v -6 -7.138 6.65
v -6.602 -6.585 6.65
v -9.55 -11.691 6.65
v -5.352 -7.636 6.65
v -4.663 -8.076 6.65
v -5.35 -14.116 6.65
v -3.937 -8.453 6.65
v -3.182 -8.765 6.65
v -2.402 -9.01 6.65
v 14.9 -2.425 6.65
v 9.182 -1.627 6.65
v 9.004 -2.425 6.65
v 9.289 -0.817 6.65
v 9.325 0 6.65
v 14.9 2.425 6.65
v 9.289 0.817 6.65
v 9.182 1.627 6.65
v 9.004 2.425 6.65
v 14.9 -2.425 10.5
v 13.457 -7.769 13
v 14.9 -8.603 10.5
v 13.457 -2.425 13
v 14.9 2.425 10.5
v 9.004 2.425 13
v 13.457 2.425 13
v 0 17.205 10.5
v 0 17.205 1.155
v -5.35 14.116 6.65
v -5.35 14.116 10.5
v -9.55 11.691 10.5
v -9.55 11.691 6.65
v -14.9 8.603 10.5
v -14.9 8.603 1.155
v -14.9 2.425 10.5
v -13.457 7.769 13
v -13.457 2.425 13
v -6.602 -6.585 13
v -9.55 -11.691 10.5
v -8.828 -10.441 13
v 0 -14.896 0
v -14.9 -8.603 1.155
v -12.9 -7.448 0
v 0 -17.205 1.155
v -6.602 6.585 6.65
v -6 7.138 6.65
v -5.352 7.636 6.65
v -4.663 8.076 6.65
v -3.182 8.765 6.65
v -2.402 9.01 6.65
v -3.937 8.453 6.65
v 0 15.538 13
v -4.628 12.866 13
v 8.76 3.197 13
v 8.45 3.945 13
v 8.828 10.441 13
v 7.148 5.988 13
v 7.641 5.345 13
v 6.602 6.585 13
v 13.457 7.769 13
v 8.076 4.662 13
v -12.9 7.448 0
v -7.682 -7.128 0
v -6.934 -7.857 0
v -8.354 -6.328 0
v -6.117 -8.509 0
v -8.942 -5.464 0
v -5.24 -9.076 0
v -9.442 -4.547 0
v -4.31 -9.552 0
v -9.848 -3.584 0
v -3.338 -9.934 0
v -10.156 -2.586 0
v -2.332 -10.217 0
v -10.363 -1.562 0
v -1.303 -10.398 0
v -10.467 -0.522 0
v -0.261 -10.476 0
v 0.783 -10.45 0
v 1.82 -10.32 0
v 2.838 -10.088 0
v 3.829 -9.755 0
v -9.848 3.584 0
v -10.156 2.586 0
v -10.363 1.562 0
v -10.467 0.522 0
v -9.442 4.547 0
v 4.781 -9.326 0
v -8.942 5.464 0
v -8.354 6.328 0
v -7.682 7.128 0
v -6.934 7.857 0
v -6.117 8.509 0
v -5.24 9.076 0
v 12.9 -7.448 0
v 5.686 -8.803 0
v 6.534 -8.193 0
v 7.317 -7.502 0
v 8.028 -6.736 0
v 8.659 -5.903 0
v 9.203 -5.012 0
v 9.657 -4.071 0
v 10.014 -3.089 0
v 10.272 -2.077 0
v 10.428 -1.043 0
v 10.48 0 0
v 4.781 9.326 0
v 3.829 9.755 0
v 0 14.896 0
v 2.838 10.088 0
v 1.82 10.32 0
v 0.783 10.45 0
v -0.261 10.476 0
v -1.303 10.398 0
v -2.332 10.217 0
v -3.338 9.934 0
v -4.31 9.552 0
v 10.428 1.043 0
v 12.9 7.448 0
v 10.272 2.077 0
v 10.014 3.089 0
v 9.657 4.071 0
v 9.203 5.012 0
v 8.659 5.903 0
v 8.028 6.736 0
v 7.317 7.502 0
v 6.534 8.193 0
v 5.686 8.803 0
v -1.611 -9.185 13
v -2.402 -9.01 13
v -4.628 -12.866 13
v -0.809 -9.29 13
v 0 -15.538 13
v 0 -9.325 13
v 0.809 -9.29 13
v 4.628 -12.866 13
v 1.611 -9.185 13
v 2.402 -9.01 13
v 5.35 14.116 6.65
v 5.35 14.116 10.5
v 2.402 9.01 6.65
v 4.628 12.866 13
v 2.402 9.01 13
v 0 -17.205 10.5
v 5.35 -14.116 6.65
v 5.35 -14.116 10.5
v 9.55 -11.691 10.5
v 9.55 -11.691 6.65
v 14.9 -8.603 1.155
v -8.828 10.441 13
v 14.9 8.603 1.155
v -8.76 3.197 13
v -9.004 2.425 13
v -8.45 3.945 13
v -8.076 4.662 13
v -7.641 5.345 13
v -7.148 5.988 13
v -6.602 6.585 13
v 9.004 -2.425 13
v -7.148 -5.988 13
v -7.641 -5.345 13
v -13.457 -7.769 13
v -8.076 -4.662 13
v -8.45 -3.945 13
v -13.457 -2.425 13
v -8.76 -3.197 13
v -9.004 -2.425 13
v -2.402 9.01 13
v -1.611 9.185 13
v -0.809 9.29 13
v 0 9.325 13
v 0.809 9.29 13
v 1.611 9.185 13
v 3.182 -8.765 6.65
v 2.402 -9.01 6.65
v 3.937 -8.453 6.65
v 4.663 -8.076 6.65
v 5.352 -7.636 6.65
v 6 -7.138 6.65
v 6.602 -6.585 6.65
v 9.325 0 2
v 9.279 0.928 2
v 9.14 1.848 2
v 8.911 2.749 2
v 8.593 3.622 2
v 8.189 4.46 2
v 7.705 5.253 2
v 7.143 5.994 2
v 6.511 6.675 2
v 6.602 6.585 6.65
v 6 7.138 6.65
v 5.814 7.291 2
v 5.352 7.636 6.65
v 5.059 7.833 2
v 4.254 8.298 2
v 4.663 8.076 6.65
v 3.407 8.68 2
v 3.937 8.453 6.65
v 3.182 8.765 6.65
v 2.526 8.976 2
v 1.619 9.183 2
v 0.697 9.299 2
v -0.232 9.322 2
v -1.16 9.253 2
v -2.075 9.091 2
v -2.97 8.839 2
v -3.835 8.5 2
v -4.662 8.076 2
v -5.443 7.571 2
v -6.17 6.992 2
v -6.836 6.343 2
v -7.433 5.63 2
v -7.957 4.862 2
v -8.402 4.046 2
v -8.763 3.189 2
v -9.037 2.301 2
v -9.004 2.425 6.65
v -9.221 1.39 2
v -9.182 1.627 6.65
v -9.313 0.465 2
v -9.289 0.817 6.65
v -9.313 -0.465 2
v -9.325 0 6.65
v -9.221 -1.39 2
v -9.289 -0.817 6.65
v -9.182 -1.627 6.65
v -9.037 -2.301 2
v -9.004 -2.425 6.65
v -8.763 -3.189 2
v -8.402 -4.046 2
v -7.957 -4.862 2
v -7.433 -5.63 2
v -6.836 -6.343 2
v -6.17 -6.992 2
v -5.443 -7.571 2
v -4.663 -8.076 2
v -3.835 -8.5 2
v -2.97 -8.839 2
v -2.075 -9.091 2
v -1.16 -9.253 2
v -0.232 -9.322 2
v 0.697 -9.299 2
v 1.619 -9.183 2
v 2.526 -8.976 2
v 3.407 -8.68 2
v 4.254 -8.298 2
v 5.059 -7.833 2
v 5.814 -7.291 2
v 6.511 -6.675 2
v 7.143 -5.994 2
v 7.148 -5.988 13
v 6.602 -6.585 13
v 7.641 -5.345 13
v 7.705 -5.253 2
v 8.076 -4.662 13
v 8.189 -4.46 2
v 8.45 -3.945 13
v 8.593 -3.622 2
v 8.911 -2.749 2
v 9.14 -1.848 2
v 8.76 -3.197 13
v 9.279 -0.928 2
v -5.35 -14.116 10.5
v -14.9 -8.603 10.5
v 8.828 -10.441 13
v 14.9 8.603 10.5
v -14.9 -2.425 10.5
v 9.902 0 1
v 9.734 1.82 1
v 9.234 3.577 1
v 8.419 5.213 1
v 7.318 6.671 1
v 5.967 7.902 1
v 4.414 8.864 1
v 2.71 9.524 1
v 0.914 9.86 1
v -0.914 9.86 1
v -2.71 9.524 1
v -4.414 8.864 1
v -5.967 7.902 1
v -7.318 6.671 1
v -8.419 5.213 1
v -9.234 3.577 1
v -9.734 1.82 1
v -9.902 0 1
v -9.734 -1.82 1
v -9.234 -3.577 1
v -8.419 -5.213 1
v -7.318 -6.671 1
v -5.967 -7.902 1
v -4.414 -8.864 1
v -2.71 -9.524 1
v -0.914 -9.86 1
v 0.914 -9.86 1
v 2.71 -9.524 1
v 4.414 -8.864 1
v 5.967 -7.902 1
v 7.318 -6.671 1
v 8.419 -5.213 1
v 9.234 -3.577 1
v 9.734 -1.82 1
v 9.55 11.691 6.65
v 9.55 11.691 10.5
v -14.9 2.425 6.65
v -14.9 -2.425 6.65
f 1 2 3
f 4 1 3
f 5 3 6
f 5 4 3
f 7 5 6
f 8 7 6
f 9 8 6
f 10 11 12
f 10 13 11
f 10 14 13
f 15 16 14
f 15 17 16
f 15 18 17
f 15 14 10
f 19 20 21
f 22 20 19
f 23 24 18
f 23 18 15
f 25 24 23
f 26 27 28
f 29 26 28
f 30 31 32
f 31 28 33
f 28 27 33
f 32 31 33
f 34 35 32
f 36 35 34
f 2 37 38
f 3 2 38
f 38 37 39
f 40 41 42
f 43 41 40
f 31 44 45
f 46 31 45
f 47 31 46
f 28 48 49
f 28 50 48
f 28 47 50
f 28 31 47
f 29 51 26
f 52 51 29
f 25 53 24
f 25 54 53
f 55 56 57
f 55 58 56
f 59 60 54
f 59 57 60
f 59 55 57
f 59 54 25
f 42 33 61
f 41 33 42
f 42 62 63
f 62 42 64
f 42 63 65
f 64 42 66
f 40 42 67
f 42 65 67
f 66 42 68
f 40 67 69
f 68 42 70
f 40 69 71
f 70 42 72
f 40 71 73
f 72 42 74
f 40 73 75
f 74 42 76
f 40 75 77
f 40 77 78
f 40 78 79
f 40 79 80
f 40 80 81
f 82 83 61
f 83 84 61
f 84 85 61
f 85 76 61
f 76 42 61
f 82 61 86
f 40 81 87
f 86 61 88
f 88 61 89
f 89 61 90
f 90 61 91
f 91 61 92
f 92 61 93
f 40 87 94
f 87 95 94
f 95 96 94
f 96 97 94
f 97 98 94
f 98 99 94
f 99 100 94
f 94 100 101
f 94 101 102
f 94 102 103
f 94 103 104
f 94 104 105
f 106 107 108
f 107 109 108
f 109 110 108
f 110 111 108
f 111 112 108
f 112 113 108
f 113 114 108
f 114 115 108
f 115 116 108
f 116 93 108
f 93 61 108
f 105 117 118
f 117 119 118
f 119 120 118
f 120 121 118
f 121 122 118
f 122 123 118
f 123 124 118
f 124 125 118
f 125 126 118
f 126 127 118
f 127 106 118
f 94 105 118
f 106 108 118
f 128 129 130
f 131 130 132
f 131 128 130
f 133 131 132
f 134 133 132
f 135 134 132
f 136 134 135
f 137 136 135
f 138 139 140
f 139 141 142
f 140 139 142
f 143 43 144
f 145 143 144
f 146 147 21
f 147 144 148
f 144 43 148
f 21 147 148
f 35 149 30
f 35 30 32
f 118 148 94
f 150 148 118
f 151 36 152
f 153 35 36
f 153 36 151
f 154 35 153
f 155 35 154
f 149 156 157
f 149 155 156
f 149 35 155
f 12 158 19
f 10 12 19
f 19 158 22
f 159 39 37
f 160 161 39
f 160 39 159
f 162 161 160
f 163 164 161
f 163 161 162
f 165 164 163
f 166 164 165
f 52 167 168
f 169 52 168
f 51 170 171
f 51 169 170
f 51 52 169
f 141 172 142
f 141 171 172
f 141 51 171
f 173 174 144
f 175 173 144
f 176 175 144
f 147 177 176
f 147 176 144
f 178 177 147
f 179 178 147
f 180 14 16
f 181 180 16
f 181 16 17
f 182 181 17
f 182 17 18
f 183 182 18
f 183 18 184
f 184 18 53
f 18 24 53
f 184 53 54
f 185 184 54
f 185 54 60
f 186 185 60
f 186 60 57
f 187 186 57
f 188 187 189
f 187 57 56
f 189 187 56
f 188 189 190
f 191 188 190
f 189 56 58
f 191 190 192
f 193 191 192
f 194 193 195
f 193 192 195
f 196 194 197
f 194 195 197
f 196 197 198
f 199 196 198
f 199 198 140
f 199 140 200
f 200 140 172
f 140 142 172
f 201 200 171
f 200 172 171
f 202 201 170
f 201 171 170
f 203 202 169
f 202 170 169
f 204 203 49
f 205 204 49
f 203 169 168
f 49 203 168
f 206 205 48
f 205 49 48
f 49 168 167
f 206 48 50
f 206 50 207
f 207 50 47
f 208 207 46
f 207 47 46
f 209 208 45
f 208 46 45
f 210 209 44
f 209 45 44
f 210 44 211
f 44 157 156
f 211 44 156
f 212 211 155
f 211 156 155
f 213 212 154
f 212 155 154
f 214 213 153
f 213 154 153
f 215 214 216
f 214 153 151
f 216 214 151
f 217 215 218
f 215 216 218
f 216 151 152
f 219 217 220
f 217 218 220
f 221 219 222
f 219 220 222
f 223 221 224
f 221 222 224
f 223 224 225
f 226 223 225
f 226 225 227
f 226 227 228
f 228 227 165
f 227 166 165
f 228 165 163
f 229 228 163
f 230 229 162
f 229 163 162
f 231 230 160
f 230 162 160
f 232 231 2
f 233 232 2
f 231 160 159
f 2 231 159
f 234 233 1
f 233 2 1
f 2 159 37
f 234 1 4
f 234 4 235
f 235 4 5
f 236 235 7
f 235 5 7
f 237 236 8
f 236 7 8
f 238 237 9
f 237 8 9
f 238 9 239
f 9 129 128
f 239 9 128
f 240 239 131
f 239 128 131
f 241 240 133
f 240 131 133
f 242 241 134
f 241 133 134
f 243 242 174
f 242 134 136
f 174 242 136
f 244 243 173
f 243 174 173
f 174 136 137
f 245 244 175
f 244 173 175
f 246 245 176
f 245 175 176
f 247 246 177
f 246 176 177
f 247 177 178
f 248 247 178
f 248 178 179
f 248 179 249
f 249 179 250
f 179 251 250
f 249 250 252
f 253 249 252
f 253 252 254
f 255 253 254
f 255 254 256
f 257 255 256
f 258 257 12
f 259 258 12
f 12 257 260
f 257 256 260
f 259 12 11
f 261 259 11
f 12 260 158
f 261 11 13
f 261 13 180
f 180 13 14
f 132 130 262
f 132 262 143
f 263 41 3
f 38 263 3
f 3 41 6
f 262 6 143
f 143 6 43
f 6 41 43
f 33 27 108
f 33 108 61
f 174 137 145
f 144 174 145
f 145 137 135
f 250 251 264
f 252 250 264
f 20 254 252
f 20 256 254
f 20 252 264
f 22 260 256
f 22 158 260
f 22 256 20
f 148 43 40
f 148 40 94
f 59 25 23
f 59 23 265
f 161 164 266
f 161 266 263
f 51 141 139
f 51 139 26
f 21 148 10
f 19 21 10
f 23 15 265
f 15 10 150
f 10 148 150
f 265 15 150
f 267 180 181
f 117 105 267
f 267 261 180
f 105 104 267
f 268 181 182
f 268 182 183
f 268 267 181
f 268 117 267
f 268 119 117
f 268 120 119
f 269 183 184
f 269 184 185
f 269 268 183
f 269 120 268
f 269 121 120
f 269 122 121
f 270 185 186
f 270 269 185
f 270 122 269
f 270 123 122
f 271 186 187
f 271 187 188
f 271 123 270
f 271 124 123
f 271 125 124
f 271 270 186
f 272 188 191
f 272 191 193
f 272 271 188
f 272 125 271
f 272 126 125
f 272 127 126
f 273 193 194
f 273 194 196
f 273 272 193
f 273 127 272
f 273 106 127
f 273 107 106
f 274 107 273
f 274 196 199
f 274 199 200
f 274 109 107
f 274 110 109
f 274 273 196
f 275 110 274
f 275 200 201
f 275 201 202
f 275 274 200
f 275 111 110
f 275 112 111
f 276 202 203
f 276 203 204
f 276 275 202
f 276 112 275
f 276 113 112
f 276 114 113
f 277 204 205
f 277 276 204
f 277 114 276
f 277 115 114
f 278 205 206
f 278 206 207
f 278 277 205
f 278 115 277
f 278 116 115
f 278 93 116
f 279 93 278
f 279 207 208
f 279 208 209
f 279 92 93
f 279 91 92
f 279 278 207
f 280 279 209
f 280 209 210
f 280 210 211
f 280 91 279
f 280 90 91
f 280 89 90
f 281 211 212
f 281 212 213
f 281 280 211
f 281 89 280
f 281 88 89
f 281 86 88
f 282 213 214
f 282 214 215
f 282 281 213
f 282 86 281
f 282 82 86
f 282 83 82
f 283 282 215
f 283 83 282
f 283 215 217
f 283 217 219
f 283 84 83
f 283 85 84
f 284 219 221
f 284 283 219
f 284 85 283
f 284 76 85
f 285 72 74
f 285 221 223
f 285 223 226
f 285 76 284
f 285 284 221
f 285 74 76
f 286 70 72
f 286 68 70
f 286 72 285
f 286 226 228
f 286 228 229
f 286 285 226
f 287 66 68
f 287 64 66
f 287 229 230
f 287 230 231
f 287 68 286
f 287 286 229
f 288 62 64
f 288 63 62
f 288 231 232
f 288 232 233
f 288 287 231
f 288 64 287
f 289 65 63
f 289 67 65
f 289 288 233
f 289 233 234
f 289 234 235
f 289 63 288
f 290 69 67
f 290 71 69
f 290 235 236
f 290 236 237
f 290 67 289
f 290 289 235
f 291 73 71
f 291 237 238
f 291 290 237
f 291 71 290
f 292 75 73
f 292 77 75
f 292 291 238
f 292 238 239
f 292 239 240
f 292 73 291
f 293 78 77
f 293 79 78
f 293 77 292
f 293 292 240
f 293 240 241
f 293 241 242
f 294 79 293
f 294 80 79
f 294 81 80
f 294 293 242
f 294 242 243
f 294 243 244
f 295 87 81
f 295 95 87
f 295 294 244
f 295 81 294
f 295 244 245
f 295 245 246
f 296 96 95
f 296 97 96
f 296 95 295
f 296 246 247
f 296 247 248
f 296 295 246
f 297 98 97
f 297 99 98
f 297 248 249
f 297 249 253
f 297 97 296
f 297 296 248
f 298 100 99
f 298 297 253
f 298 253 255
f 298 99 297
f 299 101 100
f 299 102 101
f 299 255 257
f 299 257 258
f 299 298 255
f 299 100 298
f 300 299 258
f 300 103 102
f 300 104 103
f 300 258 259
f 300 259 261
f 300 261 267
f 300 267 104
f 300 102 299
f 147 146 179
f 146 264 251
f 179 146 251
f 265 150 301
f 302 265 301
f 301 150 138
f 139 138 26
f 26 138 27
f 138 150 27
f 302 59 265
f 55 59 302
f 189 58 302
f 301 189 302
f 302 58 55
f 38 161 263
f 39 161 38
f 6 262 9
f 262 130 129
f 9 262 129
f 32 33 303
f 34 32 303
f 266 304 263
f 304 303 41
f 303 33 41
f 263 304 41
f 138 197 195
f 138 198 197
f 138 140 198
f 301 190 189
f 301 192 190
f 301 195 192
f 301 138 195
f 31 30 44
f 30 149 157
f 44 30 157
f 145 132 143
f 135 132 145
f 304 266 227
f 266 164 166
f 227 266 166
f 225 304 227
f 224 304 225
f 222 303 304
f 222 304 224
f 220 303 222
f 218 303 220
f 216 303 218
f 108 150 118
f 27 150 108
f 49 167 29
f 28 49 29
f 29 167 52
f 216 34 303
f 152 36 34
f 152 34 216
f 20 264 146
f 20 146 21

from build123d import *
from OCP.BRepFilletAPI import BRepFilletAPI_MakeChamfer

# Parameters (mm, degrees)
RESSALTO_EXTRUS_O2_DEPTH = 13
ESBO_O3_R                = 9.325
CORTE_EXTRUS_O1_DEPTH    = 27.211129951
ESBO_O4_W                = 8.746276247
ESBO_O4_H                = 4.85
CORTE_EXTRUS_O2_DEPTH    = 6.35
CHANFRO1_SIZE            = 2.5
CHANFRO1_SIZE2           = 1.443375673
CHANFRO2_SIZE            = 2
CHANFRO2_SIZE2           = 1.154700538
CHANFRO3_SIZE            = 2
CHANFRO3_SIZE2           = 1.154700538


with BuildPart() as part:
    # Esboço1 → Ressalto-extrusão2 (new body)
    with BuildSketch(Plane.XY):
        Polygon((0, 17.205038022), (-14.9, 8.602519011), (-14.9, -8.602519011), (0, -17.205038022), (14.9, -8.602519011), (14.9, 8.602519011), align=None)
    extrude(amount=RESSALTO_EXTRUS_O2_DEPTH)

    # Esboço3 → Corte-extrusão1 (cut, through all)
    with BuildSketch(Plane.XY.offset(13)):
        Circle(ESBO_O3_R)
    extrude(amount=-CORTE_EXTRUS_O1_DEPTH, mode=Mode.SUBTRACT)

    # Esboço4 → Corte-extrusão2 (cut)
    with BuildSketch(Plane.XY.offset(13)):
        with Locations((-10.526861876, 0)):
            Rectangle(ESBO_O4_W, ESBO_O4_H)
        Polygon((-5.349888396, 14.116278516), (-9.550111604, 11.691278516), (-5.176973481, 4.116781098), (-0.976750273, 6.541781098), align=None)
        Polygon((9.550111604, 11.691278516), (5.349888396, 14.116278516), (0.976750273, 6.541781098), (5.176973481, 4.116781098), align=None)
        with Locations((10.526861876, 0)):
            Rectangle(ESBO_O4_W, ESBO_O4_H)
        Polygon((5.349888396, -14.116278516), (9.550111604, -11.691278516), (5.176973481, -4.116781098), (0.976750273, -6.541781098), align=None)
        Polygon((-9.550111604, -11.691278516), (-5.349888396, -14.116278516), (-0.976750273, -6.541781098), (-5.176973481, -4.116781098), align=None)
    extrude(amount=-CORTE_EXTRUS_O2_DEPTH, mode=Mode.SUBTRACT)

    # Chanfro1: one chamfer whose edges measure the first distance from different faces: ONE call of the kernel's chamfer builder (chamfer() names one face for all edges)
    chanfro1_edges_1 = [part.edges().sort_by_distance(p)[0] for p in [
        (-14.9, 5.513759505, 13),
        (-14.9, -5.513759505, 13),
    ]]
    chanfro1_side_1 = [part.faces().sort_by_distance(p)[0] for p in [
        (-14.9, 0, 5.969058161),
    ]]
    chanfro1_edges_2 = [part.edges().sort_by_distance(p)[0] for p in [
        (-2.674944198, -15.660658269, 13),
        (-12.225055802, -10.146898764, 13),
    ]]
    chanfro1_side_2 = [part.faces().sort_by_distance(p)[0] for p in [
        (-7.45, -12.903778516, 5.969058161),
    ]]
    chanfro1_edges_3 = [part.edges().sort_by_distance(p)[0] for p in [
        (2.674944198, -15.660658269, 13),
        (12.225055802, -10.146898764, 13),
    ]]
    chanfro1_side_3 = [part.faces().sort_by_distance(p)[0] for p in [
        (7.45, -12.903778516, 5.969058161),
    ]]
    chanfro1_edges_4 = [part.edges().sort_by_distance(p)[0] for p in [
        (14.9, -5.513759505, 13),
        (14.9, 5.513759505, 13),
    ]]
    chanfro1_side_4 = [part.faces().sort_by_distance(p)[0] for p in [
        (14.9, 0, 5.969058161),
    ]]
    chanfro1_edges_5 = [part.edges().sort_by_distance(p)[0] for p in [
        (12.225055802, 10.146898764, 13),
        (2.674944198, 15.660658269, 13),
    ]]
    chanfro1_side_5 = [part.faces().sort_by_distance(p)[0] for p in [
        (7.45, 12.903778516, 5.969058161),
    ]]
    chanfro1_edges_6 = [part.edges().sort_by_distance(p)[0] for p in [
        (-12.225055802, 10.146898764, 13),
        (-2.674944198, 15.660658269, 13),
    ]]
    chanfro1_side_6 = [part.faces().sort_by_distance(p)[0] for p in [
        (-7.45, 12.903778516, 5.969058161),
    ]]
    chanfro1 = BRepFilletAPI_MakeChamfer(part.part.solid().wrapped)
    for e in chanfro1_edges_1:
        chanfro1.Add(CHANFRO1_SIZE, CHANFRO1_SIZE2, e.wrapped, chanfro1_side_1[0].wrapped)  # the first distance lies on this face
    for e in chanfro1_edges_2:
        chanfro1.Add(CHANFRO1_SIZE, CHANFRO1_SIZE2, e.wrapped, chanfro1_side_2[0].wrapped)  # the first distance lies on this face
    for e in chanfro1_edges_3:
        chanfro1.Add(CHANFRO1_SIZE, CHANFRO1_SIZE2, e.wrapped, chanfro1_side_3[0].wrapped)  # the first distance lies on this face
    for e in chanfro1_edges_4:
        chanfro1.Add(CHANFRO1_SIZE, CHANFRO1_SIZE2, e.wrapped, chanfro1_side_4[0].wrapped)  # the first distance lies on this face
    for e in chanfro1_edges_5:
        chanfro1.Add(CHANFRO1_SIZE, CHANFRO1_SIZE2, e.wrapped, chanfro1_side_5[0].wrapped)  # the first distance lies on this face
    for e in chanfro1_edges_6:
        chanfro1.Add(CHANFRO1_SIZE, CHANFRO1_SIZE2, e.wrapped, chanfro1_side_6[0].wrapped)  # the first distance lies on this face
    add(Compound.cast(chanfro1.Shape()), mode=Mode.REPLACE)

    # Chanfro2
    chanfro2_edges = [part.edges().sort_by_distance(p)[0] for p in [
        (-9.325, 0, 0),
    ]]
    chanfro2_side = [part.faces().sort_by_distance(p)[0] for p in [
        (-9.325, 0, 6.5),
    ]]
    chamfer(chanfro2_edges, length=CHANFRO2_SIZE, length2=CHANFRO2_SIZE2, reference=chanfro2_side[0])

    # Chanfro3
    chanfro3_edges = [part.edges().sort_by_distance(p)[0] for p in [
        (14.9, 0, 0),
        (7.45, -12.903778516, 0),
        (-7.45, -12.903778516, 0),
        (-14.9, 0, 0),
        (-7.45, 12.903778516, 0),
        (7.45, 12.903778516, 0),
    ]]
    chanfro3_side = [part.faces().sort_by_distance(p)[0] for p in [
        (-10.934903057, 0, 0),
    ]]
    chamfer(chanfro3_edges, length=CHANFRO3_SIZE, length2=CHANFRO3_SIZE2, reference=chanfro3_side[0])


solid = part.part
